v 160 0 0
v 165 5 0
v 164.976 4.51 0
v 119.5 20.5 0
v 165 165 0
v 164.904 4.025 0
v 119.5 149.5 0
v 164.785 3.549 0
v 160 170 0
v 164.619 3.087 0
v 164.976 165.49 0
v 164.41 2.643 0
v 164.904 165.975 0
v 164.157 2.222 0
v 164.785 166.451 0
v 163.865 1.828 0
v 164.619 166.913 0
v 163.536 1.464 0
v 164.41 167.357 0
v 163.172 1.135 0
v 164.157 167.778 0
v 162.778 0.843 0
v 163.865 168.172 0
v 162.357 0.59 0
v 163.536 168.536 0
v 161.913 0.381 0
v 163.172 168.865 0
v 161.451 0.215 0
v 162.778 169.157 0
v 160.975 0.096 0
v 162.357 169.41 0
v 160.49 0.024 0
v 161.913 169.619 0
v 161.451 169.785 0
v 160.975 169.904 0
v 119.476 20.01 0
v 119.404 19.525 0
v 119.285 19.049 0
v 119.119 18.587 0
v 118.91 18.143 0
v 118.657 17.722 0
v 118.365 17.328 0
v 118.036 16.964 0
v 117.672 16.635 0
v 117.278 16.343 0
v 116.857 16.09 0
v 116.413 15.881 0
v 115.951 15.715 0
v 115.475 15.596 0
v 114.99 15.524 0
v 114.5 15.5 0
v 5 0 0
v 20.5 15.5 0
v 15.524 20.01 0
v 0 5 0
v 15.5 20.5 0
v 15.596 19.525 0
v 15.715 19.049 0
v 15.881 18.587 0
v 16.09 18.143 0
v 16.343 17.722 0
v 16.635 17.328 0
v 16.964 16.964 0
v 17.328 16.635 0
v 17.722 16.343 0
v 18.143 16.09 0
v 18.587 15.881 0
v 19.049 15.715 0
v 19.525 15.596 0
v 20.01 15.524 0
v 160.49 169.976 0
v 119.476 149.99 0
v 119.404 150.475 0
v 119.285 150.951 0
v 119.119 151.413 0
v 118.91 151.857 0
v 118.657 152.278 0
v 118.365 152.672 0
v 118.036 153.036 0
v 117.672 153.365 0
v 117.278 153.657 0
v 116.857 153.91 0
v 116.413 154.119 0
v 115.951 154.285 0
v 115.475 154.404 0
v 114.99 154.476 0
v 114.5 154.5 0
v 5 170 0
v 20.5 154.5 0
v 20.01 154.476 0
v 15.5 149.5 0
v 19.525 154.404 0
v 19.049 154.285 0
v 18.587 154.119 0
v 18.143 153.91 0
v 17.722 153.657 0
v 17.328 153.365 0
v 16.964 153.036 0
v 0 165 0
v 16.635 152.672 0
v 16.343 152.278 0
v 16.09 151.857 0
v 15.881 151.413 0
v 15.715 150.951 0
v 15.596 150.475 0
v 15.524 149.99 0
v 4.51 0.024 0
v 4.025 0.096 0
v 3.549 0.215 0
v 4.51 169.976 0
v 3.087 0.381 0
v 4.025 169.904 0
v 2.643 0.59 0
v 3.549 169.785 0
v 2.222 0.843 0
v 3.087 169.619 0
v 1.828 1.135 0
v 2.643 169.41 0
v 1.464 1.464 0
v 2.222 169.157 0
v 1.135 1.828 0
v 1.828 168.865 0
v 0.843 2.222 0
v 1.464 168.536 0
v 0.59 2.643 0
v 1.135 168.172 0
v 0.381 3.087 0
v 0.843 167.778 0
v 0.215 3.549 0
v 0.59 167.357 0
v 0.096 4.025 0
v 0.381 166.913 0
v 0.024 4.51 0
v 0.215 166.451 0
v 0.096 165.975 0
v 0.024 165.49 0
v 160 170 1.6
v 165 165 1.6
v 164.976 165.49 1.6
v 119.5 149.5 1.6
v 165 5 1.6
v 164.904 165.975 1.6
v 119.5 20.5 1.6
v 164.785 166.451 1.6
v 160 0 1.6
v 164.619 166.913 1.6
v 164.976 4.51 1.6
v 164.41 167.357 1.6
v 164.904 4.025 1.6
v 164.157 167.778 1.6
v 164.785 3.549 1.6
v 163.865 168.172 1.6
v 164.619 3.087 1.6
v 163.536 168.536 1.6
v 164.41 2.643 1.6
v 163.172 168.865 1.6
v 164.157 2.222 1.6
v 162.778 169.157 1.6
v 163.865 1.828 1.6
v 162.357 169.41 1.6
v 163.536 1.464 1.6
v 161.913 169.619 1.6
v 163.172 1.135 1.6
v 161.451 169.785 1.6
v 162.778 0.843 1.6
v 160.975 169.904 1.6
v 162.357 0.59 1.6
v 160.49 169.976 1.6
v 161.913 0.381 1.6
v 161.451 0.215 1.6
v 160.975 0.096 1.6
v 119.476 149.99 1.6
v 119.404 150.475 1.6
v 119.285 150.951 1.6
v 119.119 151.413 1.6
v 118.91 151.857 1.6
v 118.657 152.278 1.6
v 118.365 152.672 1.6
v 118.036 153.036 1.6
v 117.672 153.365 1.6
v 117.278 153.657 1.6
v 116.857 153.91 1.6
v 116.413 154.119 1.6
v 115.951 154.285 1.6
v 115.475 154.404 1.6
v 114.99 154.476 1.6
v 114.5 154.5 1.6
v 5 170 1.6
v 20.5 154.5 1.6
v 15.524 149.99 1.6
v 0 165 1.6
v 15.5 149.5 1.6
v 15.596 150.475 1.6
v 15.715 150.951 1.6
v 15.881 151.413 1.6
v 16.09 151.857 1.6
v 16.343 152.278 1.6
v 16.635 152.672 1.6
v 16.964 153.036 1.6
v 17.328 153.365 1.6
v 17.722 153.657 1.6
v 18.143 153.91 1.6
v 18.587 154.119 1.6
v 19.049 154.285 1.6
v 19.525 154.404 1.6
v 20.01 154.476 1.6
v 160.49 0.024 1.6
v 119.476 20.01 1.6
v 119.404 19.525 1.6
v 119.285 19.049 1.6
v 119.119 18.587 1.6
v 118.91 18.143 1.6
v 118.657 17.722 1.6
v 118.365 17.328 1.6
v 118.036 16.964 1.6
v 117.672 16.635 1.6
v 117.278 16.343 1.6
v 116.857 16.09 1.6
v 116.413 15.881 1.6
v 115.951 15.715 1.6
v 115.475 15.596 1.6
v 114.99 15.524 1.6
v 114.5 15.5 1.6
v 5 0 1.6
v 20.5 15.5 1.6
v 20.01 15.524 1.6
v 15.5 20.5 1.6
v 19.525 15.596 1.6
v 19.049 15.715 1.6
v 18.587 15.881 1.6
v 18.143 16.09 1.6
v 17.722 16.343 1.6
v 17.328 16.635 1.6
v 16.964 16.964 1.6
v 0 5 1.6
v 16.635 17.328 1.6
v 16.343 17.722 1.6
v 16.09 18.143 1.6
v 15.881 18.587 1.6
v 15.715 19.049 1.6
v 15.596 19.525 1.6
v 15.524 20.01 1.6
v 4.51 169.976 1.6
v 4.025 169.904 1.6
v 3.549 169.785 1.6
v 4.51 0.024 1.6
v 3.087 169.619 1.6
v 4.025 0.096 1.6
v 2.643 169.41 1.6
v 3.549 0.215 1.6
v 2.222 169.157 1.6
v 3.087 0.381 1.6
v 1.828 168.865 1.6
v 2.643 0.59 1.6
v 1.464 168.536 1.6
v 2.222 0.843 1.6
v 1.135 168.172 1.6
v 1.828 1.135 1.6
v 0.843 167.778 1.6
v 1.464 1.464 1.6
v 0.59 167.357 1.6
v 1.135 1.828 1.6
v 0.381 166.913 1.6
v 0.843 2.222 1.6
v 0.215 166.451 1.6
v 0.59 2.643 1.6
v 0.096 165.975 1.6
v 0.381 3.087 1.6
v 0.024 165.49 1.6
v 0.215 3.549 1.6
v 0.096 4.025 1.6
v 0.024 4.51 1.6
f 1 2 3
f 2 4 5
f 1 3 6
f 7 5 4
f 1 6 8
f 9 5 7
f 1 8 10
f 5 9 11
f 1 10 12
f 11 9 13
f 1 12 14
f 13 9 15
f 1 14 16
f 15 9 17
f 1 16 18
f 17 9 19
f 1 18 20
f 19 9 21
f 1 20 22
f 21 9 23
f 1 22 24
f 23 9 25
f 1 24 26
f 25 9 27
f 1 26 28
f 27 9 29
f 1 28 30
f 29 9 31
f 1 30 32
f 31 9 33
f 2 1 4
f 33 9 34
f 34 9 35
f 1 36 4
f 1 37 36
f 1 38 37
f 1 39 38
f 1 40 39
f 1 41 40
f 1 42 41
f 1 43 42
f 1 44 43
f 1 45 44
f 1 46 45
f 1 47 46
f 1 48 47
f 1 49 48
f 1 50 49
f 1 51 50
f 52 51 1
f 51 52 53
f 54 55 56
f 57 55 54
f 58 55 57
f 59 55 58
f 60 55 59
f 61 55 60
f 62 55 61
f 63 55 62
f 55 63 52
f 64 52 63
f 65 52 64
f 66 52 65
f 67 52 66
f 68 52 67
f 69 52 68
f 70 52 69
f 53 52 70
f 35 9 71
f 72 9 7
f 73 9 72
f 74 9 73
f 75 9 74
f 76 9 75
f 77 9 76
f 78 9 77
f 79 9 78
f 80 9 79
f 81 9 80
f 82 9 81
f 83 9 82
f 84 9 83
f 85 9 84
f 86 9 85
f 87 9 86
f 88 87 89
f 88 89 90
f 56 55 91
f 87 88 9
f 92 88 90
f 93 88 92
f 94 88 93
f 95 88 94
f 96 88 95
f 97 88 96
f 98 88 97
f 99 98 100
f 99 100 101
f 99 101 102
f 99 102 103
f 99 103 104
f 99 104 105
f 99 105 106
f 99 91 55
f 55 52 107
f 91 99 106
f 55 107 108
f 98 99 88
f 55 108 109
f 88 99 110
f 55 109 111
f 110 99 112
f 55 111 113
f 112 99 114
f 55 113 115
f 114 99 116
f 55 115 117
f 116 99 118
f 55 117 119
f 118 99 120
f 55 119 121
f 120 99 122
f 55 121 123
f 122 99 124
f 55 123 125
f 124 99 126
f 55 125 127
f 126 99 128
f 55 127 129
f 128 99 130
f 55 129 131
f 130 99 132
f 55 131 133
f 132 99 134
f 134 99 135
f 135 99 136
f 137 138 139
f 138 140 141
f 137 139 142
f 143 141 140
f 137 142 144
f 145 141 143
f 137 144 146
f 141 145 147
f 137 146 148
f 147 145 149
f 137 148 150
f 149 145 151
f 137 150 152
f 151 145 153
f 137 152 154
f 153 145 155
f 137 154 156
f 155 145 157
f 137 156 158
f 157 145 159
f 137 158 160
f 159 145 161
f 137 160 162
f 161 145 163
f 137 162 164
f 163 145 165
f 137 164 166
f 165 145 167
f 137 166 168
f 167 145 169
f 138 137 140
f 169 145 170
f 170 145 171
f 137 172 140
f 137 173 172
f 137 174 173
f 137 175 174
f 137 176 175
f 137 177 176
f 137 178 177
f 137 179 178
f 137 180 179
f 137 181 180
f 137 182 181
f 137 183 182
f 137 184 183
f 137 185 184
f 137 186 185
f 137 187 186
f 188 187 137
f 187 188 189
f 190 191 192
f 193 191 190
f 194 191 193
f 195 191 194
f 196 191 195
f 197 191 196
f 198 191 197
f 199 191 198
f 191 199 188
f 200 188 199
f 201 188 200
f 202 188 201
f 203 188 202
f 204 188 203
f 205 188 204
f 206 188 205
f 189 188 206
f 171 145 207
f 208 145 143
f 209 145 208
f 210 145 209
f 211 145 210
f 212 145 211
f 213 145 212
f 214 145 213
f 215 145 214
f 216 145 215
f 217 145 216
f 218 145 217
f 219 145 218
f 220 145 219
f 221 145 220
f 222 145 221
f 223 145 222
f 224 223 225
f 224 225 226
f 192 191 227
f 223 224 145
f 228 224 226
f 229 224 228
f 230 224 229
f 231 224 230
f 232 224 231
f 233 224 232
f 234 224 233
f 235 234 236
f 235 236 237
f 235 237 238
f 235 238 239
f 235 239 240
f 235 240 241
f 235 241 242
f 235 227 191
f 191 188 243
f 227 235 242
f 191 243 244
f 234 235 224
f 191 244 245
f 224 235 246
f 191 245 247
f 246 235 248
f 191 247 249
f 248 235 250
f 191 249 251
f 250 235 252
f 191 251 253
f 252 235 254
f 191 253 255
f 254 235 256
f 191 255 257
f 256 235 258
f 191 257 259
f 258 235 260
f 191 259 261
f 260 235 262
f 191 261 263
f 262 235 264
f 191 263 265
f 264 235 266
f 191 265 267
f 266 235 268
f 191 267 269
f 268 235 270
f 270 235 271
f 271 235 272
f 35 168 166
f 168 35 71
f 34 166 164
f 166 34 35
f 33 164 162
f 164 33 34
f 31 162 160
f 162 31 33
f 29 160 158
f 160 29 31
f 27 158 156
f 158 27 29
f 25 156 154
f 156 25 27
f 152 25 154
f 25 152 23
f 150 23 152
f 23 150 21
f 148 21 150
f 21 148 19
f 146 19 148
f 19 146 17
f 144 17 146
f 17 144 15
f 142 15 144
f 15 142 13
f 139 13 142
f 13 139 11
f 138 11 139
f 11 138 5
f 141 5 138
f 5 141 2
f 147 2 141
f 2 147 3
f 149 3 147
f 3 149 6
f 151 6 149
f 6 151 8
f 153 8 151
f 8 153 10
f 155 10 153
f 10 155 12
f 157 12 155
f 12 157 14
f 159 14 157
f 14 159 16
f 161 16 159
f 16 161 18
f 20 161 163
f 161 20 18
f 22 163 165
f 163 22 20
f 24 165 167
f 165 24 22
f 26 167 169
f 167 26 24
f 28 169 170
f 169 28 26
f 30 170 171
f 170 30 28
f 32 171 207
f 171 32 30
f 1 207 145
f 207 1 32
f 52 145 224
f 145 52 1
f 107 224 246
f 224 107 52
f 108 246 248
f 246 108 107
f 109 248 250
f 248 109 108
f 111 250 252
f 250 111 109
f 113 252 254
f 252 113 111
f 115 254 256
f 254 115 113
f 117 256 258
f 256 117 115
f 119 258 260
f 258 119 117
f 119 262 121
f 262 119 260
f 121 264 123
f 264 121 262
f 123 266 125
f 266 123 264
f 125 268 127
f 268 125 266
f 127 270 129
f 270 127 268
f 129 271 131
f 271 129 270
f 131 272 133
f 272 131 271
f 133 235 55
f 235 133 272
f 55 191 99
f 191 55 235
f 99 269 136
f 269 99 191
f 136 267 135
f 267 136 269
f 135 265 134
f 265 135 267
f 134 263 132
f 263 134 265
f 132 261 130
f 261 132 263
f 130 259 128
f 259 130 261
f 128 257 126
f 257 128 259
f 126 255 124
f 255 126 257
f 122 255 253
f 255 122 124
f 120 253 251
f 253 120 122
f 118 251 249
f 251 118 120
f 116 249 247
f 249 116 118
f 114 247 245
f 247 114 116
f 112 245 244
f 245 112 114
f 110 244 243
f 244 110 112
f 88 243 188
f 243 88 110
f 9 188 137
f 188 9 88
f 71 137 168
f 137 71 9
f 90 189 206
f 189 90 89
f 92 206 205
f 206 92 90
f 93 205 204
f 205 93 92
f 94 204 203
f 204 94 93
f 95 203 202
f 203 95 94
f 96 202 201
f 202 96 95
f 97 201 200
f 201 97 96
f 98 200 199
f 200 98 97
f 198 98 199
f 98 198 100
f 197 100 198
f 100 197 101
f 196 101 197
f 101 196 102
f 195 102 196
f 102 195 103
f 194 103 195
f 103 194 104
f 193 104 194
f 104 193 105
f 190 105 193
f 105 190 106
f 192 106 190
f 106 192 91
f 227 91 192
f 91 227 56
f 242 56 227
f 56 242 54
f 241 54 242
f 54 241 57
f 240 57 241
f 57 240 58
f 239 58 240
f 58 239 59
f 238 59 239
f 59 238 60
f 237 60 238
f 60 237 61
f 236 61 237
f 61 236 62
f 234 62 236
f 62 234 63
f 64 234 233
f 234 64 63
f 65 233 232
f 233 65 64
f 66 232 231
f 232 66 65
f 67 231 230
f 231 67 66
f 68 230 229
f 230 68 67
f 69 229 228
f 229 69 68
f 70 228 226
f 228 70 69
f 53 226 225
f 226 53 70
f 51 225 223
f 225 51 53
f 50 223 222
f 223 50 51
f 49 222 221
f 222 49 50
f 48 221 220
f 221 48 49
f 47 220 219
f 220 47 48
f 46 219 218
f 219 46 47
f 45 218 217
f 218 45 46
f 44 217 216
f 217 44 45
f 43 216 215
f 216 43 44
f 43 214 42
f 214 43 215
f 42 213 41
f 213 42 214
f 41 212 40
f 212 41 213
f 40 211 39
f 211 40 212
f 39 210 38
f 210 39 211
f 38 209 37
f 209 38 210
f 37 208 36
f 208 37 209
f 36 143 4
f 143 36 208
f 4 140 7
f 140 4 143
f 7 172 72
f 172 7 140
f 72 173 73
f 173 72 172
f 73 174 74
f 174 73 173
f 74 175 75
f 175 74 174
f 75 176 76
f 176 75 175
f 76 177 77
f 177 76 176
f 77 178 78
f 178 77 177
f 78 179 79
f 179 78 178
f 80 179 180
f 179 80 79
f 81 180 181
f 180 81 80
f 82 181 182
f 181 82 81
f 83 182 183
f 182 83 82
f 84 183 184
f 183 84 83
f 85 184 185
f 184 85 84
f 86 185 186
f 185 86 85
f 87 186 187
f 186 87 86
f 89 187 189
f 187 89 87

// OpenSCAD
// Open Media Divider: shelf divider with flush two-colour lettering, printed face-down.
// The visible face is printed on the build plate. The first layers hold the letters, set flush into the face.
// Optionally a backing in the letter colour sits behind the face, so the letters can't show through from the back.
// Export the "white" (body) and "black" (letters + backing) parts separately and load them together in the
// slicer as one object with two parts. The colour names are just names: assign any filaments in the slicer.
//
// Copyright (C) 2026 TheGabeCodes. https://github.com/TheGabeCodes/open-media-divider
// Licensed under the GNU General Public License v3.0 or later (GPL-3.0-or-later); see LICENSE.

/* [Label] */
// The text on the label
label_text = "Gilliam, Terry";
// Font. Roboto Condensed Bold is the default: narrow enough for long names, open and easy to read. Barlow Semi Condensed is similarly narrow but squarer; Inter is wider. Liberation Sans is metrically matched to Arial / Helvetica and ships with OpenSCAD. In desktop OpenSCAD, the other fonts must be installed on your computer
font = "Roboto Condensed:style=Bold"; // ["Barlow Semi Condensed:style=Bold", "Inter:style=Bold", "Inter:style=SemiBold", "Liberation Sans:style=Bold", "Liberation Sans:style=Regular", "Roboto Condensed:style=Bold"]
// Text size: about the height of the capital letters, in mm (not points)
text_size = 10; // [4:0.5:20]
// Letter spacing (1 = the font's normal spacing)
letter_spacing = 1.0; // [0.8:0.01:1.5]
// Where the text sits along the strip, as the divider stands on the shelf
text_align = "bottom"; // [bottom, center, top]
// Gap from the bottom (or top) end of the strip to the text, for bottom and top alignment (mm)
text_end_inset = 10; // [0:0.5:60]
// Distance from the strip's outer (front) edge to the text baseline (mm)
baseline_inset = 10; // [2:0.5:40]

/* [Panel] */
// Panel width, front to back (mm)
panel_width = 165; // [60:0.5:300]
// Panel height (mm)
panel_height = 170; // [60:0.5:300]
// Total thickness (mm)
thickness = 1.6; // [0.8:0.1:5]
// Outer corner radius (mm); the inside corners of the L and U use it too
corner_radius = 5; // [0:0.5:20]
// Width of the solid strip that carries the text, and of the L and U bars (mm)
strip_width = 45.5; // [20:0.5:120]

/* [Type] */
// Shape. full: frame with a window (least material). L: text strip plus a bar along the shelf; two fit on one plate. U: the L plus a back leg, open at the top; meets the back of the shelf at any height; two fit on one plate
type = "full"; // [full, L, U]

/* [Window] */
// Cut a window to save material (full type only)
window = true;
// Width of the frame on the other three sides (mm)
window_margin = 15.5; // [5:0.5:60]
// Window corner radius (mm)
window_radius = 5; // [0:0.5:20]

/* [Print] */
// The layer height you print at (mm). Letter, face and backing depths are counted in layers, so set this to match your slicer
layer_height = 0.2; // [0.08:0.02:0.32]
// How many layers deep the letters go (depth = letter layers × layer height)
letter_layers = 2; // [1:1:8]
// Optional layer of letter colour behind the face. It stops the letters showing through faintly from the back, but the face may look slightly greyer. Meant for dark letters on a light body. Adds one filament change
backing = "none"; // [none:None, letters:Letter colour]
// Layers of body colour in front of the backing (depth = face layers × layer height). The backing fills the rest of the thickness
face_layers = 5; // [2:1:20]
// Which part to output
part = "both"; // [both, white, black]

/* [Hidden] */
$fn = 64;
letter_depth = letter_layers * layer_height;
face_depth = face_layers * layer_height;
backed = backing == "letters";
assert(type == "full" || strip_width < panel_height - 20, "strip_width too large for the panel height");
assert(type != "U" || 2 * strip_width + 2 * corner_radius < panel_width, "strip_width too large for the panel width (U)");
assert(!backed || face_layers > letter_layers, str("face layers (", face_layers, ") must be more than the letter layers (", letter_layers, ")"));
assert(!backed || face_depth < thickness - layer_height / 2, str("no room for the backing: the face (", face_depth, " mm) must be thinner than the thickness (", thickness, " mm)"));
assert(letter_depth < thickness, str("letter depth (", letter_depth, " mm) must be less than the thickness (", thickness, " mm)"));
assert(type != "full" || !window || strip_width + window_margin + 2 * window_radius < panel_width, "window does not fit: reduce strip_width or window_margin");
assert(type != "full" || !window || 2 * window_margin + 2 * window_radius < panel_height, "window does not fit: reduce window_margin");

module rrect(w, h, r) if (r > 0) translate([r, r]) offset(r = r) square([w - 2 * r, h - 2 * r]); else square([w, h]);

// --- layout: the face as it stands on the shelf (x right, y up, y = 0 is the edge on the shelf) ---
// text strip along the right (front) edge; the back edge is on the left
module panel2d() if (type == "L" || type == "U") {
    // text strip + bar (+ back leg for U), every corner (outside and inside) rounded to corner_radius
    offset(r = -corner_radius) offset(delta = corner_radius) union() {
        translate([panel_width - strip_width, 0]) rrect(strip_width, panel_height, corner_radius);
        // bar along the bottom edge, which sits on the shelf
        rrect(panel_width, strip_width, corner_radius);
        // U: back leg along the back edge, full height, so the divider meets the shelf back at any height
        if (type == "U") rrect(strip_width, panel_height, corner_radius);
    }
} else difference() {
    rrect(panel_width, panel_height, corner_radius);
    if (window) translate([window_margin, window_margin])
        rrect(panel_width - strip_width - window_margin, panel_height - 2 * window_margin, window_radius);
}
// text runs up the front strip like a book spine: reads bottom to top, letter tops toward the back
module text2d() {
    y = text_align == "bottom" ? text_end_inset : text_align == "top" ? panel_height - text_end_inset : panel_height / 2;
    h = text_align == "bottom" ? "left" : text_align == "top" ? "right" : "center";
    translate([panel_width - baseline_inset, y]) rotate(90)
        text(label_text, size = text_size, font = font, spacing = letter_spacing, halign = h, valign = "baseline");
}
module letters2d() intersection() { panel2d(); text2d(); }

// --- bodies, in print orientation: the face is on the plate (z = 0), flipped so it reads correctly from the front ---
module print_orient() translate([0, panel_height, 0]) mirror([0, 1, 0]) children();
module white_part() print_orient() difference() {
    linear_extrude(backed ? face_depth : thickness) panel2d();
    translate([0, 0, -1]) linear_extrude(letter_depth + 1) letters2d();
}
module black_part() print_orient() {
    linear_extrude(letter_depth) letters2d();
    // letter-colour backing behind the face
    if (backed) translate([0, 0, face_depth]) linear_extrude(thickness - face_depth) panel2d();
}

if (part != "black") color("white") white_part();
if (part != "white") color([0.15, 0.15, 0.15]) black_part();
